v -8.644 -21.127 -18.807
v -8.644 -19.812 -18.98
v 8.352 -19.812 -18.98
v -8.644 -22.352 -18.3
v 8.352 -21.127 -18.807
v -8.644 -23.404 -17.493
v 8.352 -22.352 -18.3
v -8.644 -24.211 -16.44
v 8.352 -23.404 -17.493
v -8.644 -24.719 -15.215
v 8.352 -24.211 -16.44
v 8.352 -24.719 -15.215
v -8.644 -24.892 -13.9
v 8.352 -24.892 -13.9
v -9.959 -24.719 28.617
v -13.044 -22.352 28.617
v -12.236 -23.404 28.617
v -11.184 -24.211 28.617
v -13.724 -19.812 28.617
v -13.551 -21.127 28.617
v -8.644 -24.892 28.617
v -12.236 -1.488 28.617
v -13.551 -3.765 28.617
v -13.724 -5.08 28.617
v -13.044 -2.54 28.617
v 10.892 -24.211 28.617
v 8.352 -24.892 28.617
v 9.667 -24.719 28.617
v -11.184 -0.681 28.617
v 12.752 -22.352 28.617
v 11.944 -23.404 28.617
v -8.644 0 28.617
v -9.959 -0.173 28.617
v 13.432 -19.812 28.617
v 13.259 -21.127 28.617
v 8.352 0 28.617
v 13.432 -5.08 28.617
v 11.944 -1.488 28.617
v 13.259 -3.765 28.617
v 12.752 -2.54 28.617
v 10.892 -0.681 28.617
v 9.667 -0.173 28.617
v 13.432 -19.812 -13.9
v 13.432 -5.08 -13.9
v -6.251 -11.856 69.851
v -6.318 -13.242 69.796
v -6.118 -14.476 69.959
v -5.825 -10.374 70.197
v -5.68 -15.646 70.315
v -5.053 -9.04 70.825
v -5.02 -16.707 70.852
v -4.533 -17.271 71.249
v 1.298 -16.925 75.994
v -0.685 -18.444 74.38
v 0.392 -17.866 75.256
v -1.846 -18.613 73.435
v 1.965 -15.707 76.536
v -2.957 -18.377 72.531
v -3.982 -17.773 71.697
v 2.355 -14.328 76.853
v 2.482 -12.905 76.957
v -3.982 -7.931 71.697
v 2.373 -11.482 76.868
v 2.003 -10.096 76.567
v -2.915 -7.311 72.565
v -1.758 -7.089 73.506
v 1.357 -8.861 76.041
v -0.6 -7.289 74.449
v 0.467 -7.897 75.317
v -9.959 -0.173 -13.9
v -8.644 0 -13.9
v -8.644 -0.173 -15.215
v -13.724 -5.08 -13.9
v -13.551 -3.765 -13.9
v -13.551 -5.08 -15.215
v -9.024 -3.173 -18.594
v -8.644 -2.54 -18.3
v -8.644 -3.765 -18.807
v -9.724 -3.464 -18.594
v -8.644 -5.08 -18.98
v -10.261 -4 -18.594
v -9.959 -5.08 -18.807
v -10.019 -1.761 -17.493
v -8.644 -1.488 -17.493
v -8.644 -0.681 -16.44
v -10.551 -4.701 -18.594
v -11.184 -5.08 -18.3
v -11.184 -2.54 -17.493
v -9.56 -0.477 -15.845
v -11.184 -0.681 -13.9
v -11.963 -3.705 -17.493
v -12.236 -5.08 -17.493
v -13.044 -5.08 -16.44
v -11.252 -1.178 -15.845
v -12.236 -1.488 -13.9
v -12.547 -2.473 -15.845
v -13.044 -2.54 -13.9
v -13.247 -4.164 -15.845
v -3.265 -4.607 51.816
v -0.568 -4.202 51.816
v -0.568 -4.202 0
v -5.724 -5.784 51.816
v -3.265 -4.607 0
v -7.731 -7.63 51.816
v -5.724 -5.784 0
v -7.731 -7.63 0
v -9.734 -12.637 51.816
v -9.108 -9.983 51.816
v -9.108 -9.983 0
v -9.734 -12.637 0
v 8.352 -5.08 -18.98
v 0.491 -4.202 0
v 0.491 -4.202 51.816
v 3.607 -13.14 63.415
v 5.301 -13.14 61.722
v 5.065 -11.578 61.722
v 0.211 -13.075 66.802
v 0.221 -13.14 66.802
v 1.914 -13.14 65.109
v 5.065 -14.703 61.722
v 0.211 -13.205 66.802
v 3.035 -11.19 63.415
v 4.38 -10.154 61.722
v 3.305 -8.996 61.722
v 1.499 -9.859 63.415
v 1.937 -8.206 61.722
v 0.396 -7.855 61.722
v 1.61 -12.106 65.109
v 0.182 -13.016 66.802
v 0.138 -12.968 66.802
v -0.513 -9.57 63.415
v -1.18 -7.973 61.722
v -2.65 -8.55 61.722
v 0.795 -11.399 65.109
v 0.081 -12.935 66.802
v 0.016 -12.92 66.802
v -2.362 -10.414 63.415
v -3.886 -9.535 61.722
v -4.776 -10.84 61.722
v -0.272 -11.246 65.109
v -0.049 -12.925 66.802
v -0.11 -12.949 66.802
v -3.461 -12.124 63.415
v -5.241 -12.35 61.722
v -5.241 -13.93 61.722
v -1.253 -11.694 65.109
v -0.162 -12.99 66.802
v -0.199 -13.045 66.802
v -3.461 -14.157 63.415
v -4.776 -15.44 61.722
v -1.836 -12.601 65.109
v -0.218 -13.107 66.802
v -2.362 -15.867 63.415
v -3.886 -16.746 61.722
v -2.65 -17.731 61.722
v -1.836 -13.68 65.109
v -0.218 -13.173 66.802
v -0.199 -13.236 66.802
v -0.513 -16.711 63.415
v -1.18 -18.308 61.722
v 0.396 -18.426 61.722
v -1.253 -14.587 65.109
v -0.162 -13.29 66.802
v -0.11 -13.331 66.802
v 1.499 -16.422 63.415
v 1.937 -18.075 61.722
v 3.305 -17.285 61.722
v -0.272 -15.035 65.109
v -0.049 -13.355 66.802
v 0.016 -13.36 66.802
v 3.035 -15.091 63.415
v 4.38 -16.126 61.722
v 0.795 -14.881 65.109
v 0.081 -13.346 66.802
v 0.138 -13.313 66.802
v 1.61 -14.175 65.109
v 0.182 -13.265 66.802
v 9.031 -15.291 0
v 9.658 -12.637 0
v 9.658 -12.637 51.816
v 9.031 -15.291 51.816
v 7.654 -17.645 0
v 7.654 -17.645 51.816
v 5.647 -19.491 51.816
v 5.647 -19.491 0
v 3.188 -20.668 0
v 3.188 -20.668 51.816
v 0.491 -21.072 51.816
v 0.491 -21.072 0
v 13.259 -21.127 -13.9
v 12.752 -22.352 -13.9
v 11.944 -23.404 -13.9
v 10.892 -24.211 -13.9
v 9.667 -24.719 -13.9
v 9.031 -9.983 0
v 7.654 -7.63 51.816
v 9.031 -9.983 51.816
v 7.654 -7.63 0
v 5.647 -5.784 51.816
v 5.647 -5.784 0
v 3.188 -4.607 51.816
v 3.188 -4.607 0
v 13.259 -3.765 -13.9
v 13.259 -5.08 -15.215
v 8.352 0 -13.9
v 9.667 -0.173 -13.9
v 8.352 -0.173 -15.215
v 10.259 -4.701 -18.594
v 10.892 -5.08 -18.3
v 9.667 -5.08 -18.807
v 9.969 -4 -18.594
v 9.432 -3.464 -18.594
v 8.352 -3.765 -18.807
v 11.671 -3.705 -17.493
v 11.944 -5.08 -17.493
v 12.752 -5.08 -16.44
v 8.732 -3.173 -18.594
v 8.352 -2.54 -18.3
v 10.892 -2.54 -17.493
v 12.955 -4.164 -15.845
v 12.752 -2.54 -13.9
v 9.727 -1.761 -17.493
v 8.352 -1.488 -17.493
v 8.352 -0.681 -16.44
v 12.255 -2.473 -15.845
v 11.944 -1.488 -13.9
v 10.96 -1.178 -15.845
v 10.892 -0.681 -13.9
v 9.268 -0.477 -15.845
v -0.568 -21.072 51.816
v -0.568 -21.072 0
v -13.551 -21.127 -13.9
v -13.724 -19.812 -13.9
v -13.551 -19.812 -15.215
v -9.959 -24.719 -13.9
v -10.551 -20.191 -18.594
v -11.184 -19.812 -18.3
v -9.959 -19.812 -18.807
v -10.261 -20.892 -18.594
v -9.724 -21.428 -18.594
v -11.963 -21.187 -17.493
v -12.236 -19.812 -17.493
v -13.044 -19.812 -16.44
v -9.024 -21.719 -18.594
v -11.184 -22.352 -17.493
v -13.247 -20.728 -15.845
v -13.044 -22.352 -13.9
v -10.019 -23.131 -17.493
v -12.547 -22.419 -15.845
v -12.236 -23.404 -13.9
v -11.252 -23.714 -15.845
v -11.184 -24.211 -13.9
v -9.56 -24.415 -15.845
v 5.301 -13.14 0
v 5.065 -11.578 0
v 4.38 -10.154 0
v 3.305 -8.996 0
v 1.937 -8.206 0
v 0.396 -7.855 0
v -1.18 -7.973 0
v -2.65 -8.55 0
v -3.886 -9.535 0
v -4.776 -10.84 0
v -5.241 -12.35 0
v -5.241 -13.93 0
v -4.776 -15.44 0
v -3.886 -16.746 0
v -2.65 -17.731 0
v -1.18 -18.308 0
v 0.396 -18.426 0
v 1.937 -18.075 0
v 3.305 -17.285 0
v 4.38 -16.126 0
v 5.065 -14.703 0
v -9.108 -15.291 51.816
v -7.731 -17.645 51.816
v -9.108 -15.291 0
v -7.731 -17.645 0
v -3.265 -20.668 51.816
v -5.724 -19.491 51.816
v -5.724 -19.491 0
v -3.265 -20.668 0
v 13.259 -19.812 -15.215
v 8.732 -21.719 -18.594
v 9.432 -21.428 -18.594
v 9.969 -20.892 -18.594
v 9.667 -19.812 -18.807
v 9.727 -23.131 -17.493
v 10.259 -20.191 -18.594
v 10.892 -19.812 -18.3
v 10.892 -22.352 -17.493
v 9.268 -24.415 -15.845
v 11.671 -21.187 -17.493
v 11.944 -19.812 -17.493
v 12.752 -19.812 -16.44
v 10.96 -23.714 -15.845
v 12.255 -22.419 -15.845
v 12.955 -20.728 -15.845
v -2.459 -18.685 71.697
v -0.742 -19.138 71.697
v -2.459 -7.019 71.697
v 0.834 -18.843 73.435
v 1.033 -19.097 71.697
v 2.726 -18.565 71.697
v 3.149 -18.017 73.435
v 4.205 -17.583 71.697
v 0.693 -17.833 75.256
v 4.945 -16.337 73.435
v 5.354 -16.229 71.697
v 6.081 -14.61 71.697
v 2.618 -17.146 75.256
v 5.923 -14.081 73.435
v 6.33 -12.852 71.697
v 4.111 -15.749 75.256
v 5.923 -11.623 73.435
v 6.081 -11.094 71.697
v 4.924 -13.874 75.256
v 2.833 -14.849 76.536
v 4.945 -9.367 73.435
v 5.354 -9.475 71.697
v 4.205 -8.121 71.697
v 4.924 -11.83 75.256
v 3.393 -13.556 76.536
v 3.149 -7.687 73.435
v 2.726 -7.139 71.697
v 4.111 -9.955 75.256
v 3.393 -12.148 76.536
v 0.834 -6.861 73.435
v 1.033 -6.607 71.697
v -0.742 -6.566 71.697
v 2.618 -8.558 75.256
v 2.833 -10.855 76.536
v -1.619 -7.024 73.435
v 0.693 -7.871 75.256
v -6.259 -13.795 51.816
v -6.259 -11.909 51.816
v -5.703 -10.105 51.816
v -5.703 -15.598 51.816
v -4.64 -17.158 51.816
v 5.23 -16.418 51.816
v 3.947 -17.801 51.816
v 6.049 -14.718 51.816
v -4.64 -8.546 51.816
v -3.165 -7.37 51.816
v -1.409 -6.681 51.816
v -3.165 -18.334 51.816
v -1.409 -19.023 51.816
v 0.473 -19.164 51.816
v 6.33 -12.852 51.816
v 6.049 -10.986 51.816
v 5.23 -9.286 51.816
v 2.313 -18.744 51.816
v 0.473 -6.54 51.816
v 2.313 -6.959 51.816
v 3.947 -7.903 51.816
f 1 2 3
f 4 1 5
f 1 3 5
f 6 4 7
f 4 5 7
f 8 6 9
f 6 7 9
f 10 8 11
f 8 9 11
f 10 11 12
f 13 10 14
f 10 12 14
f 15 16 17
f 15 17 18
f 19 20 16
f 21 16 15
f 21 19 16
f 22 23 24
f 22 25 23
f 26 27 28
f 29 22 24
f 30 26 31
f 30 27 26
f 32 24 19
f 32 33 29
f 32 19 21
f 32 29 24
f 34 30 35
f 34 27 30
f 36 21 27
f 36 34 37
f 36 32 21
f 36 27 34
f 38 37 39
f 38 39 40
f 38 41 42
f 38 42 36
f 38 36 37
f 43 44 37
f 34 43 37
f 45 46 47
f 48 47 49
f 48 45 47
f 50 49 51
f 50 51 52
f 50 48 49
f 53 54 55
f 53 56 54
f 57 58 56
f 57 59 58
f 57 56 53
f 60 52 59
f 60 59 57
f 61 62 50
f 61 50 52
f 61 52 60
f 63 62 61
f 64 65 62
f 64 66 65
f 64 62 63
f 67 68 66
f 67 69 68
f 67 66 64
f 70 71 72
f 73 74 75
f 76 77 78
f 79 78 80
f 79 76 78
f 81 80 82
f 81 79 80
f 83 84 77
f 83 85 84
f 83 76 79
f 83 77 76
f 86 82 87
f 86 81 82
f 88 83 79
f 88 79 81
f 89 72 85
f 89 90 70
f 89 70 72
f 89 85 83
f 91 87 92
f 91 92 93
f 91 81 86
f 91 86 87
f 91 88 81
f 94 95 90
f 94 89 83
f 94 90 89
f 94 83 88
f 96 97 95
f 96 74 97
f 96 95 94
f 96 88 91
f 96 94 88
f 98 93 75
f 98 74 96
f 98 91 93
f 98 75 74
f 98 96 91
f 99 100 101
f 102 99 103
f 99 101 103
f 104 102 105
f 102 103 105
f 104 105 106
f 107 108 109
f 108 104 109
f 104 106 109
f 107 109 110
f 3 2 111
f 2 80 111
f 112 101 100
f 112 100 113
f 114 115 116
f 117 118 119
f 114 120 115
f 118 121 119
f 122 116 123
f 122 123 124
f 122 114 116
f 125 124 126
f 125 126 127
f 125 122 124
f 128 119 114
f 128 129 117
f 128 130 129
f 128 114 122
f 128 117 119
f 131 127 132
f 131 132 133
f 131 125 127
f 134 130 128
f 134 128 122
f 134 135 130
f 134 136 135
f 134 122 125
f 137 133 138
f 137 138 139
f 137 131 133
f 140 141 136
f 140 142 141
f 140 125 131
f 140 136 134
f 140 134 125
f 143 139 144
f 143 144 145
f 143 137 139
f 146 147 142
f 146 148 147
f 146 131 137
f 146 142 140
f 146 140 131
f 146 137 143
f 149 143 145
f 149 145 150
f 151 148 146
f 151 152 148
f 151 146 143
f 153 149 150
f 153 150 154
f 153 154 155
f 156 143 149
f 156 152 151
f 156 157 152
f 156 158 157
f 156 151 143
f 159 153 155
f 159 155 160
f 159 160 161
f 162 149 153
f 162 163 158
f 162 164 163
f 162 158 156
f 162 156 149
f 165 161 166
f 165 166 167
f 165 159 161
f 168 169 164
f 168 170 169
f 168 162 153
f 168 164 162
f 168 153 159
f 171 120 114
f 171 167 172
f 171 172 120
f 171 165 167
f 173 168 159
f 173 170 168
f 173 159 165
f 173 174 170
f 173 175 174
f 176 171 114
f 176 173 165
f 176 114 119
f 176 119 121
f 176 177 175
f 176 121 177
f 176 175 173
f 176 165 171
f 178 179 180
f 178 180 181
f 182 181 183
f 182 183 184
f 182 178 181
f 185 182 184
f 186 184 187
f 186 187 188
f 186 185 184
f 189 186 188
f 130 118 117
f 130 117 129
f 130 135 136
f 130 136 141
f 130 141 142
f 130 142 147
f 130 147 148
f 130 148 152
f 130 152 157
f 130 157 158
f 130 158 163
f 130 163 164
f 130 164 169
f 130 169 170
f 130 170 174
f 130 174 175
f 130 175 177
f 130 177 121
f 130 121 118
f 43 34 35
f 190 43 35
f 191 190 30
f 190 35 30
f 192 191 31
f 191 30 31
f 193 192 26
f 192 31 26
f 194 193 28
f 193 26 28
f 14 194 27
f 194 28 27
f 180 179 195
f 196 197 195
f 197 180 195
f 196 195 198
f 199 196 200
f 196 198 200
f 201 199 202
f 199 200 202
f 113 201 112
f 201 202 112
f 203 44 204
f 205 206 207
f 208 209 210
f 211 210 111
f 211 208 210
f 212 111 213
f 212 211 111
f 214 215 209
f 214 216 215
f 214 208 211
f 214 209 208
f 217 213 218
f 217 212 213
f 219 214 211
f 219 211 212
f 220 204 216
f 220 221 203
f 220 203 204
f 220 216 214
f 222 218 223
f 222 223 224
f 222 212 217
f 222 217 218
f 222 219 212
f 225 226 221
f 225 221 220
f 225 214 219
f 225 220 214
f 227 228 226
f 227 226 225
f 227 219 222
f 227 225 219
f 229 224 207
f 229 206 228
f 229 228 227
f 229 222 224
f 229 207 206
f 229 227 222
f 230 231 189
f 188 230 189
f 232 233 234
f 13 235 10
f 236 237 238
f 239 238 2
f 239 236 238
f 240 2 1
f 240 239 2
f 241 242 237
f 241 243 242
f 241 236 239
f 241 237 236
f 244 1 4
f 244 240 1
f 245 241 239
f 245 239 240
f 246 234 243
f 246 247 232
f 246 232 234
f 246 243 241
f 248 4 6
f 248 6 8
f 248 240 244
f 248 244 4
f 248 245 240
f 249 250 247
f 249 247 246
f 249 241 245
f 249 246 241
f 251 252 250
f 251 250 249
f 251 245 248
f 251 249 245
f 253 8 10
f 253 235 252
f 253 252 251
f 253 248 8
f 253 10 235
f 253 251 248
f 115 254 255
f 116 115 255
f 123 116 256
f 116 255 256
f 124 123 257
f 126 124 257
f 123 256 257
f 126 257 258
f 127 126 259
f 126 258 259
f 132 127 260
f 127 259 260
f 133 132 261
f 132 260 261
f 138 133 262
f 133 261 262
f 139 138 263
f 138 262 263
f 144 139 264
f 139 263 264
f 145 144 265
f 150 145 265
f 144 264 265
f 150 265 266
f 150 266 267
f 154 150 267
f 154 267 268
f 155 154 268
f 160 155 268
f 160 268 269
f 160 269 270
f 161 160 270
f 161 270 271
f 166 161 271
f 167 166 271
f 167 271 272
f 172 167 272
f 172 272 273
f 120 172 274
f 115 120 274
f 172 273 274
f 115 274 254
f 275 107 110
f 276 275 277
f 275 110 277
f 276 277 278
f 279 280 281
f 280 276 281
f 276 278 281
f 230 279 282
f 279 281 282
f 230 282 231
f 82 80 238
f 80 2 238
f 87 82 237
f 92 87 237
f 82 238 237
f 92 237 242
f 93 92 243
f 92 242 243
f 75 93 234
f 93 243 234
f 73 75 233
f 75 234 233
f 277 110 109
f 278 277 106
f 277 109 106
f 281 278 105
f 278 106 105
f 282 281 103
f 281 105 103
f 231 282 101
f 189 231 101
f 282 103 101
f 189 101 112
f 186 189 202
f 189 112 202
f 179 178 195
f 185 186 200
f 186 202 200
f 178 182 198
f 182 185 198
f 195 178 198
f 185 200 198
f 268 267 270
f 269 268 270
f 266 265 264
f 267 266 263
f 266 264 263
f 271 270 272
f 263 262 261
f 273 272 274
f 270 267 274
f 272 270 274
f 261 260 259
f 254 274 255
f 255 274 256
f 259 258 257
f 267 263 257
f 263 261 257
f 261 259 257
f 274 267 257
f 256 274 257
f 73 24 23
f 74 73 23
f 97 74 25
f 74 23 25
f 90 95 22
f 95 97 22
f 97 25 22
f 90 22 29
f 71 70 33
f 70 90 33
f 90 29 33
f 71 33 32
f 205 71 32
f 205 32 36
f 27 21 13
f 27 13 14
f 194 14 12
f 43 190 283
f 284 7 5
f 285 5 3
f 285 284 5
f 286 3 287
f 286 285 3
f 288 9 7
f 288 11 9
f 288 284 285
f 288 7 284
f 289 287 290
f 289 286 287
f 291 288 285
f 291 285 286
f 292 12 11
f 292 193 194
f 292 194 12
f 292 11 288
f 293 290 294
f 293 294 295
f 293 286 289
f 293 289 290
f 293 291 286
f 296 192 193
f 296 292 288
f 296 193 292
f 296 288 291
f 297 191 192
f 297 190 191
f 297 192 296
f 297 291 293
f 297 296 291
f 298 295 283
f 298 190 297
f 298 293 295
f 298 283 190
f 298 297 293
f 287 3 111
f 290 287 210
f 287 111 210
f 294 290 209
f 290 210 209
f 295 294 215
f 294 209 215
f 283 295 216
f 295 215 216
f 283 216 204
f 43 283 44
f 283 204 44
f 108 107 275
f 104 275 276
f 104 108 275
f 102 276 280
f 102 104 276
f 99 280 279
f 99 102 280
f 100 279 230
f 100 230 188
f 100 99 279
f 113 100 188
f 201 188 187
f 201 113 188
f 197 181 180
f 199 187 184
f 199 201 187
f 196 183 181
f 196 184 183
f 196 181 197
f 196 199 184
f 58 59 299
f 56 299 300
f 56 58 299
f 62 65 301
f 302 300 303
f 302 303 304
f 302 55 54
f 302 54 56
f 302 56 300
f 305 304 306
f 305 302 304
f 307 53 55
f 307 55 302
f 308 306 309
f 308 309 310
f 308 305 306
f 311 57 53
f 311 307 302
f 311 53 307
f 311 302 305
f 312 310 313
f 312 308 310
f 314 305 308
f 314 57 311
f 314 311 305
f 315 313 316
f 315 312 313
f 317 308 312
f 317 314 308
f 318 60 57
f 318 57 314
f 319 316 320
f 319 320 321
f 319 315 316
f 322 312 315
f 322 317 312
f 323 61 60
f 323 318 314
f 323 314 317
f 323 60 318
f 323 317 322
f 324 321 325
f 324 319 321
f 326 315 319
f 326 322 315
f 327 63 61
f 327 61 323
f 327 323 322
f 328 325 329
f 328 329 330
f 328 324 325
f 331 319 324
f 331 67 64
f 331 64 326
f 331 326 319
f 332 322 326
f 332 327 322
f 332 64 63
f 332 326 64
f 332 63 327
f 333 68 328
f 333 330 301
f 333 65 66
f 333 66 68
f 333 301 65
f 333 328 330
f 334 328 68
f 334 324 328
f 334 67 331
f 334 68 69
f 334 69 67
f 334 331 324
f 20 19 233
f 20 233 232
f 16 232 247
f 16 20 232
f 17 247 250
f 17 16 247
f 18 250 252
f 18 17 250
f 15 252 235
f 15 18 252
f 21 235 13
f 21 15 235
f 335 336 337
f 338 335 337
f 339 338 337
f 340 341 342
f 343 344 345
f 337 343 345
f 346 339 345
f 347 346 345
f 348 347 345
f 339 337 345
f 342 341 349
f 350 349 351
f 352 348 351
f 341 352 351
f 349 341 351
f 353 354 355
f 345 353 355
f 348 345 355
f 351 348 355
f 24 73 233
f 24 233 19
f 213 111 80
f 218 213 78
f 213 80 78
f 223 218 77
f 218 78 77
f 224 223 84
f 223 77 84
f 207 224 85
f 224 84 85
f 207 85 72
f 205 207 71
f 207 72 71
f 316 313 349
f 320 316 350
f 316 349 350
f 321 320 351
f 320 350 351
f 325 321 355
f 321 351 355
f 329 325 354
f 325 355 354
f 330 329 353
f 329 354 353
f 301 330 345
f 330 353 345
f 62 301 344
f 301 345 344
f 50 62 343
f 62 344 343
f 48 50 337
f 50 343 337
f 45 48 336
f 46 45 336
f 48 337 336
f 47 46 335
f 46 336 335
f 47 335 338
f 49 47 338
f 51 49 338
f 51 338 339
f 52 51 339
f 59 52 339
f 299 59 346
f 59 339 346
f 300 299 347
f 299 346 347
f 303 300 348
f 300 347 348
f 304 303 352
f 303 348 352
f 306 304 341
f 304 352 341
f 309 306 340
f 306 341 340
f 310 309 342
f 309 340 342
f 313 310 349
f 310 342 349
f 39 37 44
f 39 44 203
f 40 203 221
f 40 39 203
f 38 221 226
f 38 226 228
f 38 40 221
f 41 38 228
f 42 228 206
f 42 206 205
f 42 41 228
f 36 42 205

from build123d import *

# Parameters (mm, degrees)
F0_R         = 46.2156340315
F1_DEPTH     = 68.834
F2_R         = 33.7265634664
F4_W         = 27.1566789597
F4_H         = 47.5971903652
F5_DEPTH     = 24.892
F6_R         = 5.08
F7_R         = 5.08
F8_W         = 19.4552922621
F8_H         = 16.8696646579
F9_DEPTH     = 51.816
F10_T1_DEPTH = 97.8067683632
F11_R        = 5.3006376135
F12_DEPTH    = 66.802
F13_SIZE     = 5.08
F14_R        = 6.3300692049
F15_DEPTH    = 25.4
F16_R        = 5.5188922036
F18_DEPTH    = 26.416


# Not quite as in the source:
# - a fillet or chamfer that OpenCascade refuses, or shapes differently, is made with other operations: its cross-section is extruded or revolved along the edge and cut away or added


with BuildPart() as f1:
    # F0 (on Front) → F1 (new body)
    with BuildSketch(Plane.XZ):
        Circle(F0_R)
    extrude(amount=F1_DEPTH)

    # F2
    f2_edges = [f1.edges().sort_by_distance(p)[0] for p in [
        (46.215634, -34.417, 0),
        (-46.215634, 0, 0),
        (-46.215634, -68.834, 0),
    ]]
    fillet(f2_edges, radius=F2_R)


with BuildPart() as f5:
    # F4 (on Front) → F5 (new body)
    with BuildSketch(Plane.XZ):
        with Locations((-0.1460043713, 4.81812004)):
            Rectangle(F4_W, F4_H)
    extrude(amount=F5_DEPTH)

    # F6
    f6_edges = [f5.edges().sort_by_distance(p)[0] for p in [
        (13.432335, -24.892, 4.81812),
        (13.432335, 0, 4.81812),
        (-13.724344, 0, 4.81812),
        (-13.724344, -24.892, 4.81812),
    ]]
    fillet(f6_edges, radius=F6_R)

    # F7
    f7_edges = [f5.edges().sort_by_distance(p)[0] for p in [
        (-12.236446, -23.404102, -18.980475),
    ]]
    fillet(f7_edges, radius=F7_R)


with BuildPart() as f9:
    # F8 (on Top) → F9 (new body)
    with BuildSketch(Plane.XY):
        with Locations((-0.0383681618, -12.6372461673)):
            Rectangle(F8_W, F8_H)
    extrude(amount=F9_DEPTH)

    # F10: fillet of radius 9.1981536726 on 4 edges, made by hand

    # F10_s2 → F10_t1 (cut)
    with BuildSketch(Plane.XY.offset(-22.9953841816)):
        with BuildLine():
            ThreePointArc((9.6892779693, -13.400567511), (6.995201133, -6.8964906747), (0.4911242967, -4.2024138384))
            Line((0.4911242967, -4.2024138384), (9.6892779693, -4.2024138384))
            Line((9.6892779693, -4.2024138384), (9.6892779693, -13.400567511))
        make_face()
        with BuildLine():
            ThreePointArc((9.6892779693, -11.8739248236), (6.995201133, -18.3780016599), (0.4911242967, -21.0720784962))
            Line((0.4911242967, -21.0720784962), (9.6892779693, -21.0720784962))
            Line((9.6892779693, -21.0720784962), (9.6892779693, -11.8739248236))
        make_face()
        with BuildLine():
            ThreePointArc((-0.5678606202, -4.2024138384), (-7.0719374565, -6.8964906747), (-9.7660142928, -13.400567511))
            Line((-9.7660142928, -13.400567511), (-9.7660142928, -4.2024138384))
            Line((-9.7660142928, -4.2024138384), (-0.5678606202, -4.2024138384))
        make_face()
        with BuildLine():
            ThreePointArc((-9.7660142928, -11.8739248236), (-7.0719374565, -18.3780016599), (-0.5678606202, -21.0720784962))
            Line((-0.5678606202, -21.0720784962), (-9.7660142928, -21.0720784962))
            Line((-9.7660142928, -21.0720784962), (-9.7660142928, -11.8739248236))
        make_face()
    extrude(amount=F10_T1_DEPTH, mode=Mode.SUBTRACT)


with BuildPart() as f12:
    # F11 (on Top) → F12 (new body)
    with BuildSketch(Plane.XY):
        with Locations((0, -13.1403291598)):
            Circle(F11_R)
    extrude(amount=F12_DEPTH)

    # F13
    f13_edges = [f12.edges().sort_by_distance(p)[0] for p in [
        (-5.300638, -13.140329, 66.802),
    ]]
    chamfer(f13_edges, length=F13_SIZE)


with BuildPart() as f15:
    # F14 (on face) → F15 (new body)
    with BuildSketch(Plane.XY.offset(51.816)):
        with Locations((0, -12.8519842401)):
            Circle(F14_R)
    extrude(amount=F15_DEPTH)

    # F16
    f16_edges = [f15.edges().sort_by_distance(p)[0] for p in [
        (-6.330069, -12.851984, 77.216),
    ]]
    fillet(f16_edges, radius=F16_R)

    # F17 (on Front) → F18 (cut)
    with BuildSketch(Plane.XZ):
        Polygon((-14.298915863, 84.5396593213), (-9.31422133, 67.3583671451), (7.7610081062, 81.2518820167), align=None)
    extrude(amount=F18_DEPTH, mode=Mode.SUBTRACT)


solid = Compound([f5.part, f9.part, f12.part, f15.part])
